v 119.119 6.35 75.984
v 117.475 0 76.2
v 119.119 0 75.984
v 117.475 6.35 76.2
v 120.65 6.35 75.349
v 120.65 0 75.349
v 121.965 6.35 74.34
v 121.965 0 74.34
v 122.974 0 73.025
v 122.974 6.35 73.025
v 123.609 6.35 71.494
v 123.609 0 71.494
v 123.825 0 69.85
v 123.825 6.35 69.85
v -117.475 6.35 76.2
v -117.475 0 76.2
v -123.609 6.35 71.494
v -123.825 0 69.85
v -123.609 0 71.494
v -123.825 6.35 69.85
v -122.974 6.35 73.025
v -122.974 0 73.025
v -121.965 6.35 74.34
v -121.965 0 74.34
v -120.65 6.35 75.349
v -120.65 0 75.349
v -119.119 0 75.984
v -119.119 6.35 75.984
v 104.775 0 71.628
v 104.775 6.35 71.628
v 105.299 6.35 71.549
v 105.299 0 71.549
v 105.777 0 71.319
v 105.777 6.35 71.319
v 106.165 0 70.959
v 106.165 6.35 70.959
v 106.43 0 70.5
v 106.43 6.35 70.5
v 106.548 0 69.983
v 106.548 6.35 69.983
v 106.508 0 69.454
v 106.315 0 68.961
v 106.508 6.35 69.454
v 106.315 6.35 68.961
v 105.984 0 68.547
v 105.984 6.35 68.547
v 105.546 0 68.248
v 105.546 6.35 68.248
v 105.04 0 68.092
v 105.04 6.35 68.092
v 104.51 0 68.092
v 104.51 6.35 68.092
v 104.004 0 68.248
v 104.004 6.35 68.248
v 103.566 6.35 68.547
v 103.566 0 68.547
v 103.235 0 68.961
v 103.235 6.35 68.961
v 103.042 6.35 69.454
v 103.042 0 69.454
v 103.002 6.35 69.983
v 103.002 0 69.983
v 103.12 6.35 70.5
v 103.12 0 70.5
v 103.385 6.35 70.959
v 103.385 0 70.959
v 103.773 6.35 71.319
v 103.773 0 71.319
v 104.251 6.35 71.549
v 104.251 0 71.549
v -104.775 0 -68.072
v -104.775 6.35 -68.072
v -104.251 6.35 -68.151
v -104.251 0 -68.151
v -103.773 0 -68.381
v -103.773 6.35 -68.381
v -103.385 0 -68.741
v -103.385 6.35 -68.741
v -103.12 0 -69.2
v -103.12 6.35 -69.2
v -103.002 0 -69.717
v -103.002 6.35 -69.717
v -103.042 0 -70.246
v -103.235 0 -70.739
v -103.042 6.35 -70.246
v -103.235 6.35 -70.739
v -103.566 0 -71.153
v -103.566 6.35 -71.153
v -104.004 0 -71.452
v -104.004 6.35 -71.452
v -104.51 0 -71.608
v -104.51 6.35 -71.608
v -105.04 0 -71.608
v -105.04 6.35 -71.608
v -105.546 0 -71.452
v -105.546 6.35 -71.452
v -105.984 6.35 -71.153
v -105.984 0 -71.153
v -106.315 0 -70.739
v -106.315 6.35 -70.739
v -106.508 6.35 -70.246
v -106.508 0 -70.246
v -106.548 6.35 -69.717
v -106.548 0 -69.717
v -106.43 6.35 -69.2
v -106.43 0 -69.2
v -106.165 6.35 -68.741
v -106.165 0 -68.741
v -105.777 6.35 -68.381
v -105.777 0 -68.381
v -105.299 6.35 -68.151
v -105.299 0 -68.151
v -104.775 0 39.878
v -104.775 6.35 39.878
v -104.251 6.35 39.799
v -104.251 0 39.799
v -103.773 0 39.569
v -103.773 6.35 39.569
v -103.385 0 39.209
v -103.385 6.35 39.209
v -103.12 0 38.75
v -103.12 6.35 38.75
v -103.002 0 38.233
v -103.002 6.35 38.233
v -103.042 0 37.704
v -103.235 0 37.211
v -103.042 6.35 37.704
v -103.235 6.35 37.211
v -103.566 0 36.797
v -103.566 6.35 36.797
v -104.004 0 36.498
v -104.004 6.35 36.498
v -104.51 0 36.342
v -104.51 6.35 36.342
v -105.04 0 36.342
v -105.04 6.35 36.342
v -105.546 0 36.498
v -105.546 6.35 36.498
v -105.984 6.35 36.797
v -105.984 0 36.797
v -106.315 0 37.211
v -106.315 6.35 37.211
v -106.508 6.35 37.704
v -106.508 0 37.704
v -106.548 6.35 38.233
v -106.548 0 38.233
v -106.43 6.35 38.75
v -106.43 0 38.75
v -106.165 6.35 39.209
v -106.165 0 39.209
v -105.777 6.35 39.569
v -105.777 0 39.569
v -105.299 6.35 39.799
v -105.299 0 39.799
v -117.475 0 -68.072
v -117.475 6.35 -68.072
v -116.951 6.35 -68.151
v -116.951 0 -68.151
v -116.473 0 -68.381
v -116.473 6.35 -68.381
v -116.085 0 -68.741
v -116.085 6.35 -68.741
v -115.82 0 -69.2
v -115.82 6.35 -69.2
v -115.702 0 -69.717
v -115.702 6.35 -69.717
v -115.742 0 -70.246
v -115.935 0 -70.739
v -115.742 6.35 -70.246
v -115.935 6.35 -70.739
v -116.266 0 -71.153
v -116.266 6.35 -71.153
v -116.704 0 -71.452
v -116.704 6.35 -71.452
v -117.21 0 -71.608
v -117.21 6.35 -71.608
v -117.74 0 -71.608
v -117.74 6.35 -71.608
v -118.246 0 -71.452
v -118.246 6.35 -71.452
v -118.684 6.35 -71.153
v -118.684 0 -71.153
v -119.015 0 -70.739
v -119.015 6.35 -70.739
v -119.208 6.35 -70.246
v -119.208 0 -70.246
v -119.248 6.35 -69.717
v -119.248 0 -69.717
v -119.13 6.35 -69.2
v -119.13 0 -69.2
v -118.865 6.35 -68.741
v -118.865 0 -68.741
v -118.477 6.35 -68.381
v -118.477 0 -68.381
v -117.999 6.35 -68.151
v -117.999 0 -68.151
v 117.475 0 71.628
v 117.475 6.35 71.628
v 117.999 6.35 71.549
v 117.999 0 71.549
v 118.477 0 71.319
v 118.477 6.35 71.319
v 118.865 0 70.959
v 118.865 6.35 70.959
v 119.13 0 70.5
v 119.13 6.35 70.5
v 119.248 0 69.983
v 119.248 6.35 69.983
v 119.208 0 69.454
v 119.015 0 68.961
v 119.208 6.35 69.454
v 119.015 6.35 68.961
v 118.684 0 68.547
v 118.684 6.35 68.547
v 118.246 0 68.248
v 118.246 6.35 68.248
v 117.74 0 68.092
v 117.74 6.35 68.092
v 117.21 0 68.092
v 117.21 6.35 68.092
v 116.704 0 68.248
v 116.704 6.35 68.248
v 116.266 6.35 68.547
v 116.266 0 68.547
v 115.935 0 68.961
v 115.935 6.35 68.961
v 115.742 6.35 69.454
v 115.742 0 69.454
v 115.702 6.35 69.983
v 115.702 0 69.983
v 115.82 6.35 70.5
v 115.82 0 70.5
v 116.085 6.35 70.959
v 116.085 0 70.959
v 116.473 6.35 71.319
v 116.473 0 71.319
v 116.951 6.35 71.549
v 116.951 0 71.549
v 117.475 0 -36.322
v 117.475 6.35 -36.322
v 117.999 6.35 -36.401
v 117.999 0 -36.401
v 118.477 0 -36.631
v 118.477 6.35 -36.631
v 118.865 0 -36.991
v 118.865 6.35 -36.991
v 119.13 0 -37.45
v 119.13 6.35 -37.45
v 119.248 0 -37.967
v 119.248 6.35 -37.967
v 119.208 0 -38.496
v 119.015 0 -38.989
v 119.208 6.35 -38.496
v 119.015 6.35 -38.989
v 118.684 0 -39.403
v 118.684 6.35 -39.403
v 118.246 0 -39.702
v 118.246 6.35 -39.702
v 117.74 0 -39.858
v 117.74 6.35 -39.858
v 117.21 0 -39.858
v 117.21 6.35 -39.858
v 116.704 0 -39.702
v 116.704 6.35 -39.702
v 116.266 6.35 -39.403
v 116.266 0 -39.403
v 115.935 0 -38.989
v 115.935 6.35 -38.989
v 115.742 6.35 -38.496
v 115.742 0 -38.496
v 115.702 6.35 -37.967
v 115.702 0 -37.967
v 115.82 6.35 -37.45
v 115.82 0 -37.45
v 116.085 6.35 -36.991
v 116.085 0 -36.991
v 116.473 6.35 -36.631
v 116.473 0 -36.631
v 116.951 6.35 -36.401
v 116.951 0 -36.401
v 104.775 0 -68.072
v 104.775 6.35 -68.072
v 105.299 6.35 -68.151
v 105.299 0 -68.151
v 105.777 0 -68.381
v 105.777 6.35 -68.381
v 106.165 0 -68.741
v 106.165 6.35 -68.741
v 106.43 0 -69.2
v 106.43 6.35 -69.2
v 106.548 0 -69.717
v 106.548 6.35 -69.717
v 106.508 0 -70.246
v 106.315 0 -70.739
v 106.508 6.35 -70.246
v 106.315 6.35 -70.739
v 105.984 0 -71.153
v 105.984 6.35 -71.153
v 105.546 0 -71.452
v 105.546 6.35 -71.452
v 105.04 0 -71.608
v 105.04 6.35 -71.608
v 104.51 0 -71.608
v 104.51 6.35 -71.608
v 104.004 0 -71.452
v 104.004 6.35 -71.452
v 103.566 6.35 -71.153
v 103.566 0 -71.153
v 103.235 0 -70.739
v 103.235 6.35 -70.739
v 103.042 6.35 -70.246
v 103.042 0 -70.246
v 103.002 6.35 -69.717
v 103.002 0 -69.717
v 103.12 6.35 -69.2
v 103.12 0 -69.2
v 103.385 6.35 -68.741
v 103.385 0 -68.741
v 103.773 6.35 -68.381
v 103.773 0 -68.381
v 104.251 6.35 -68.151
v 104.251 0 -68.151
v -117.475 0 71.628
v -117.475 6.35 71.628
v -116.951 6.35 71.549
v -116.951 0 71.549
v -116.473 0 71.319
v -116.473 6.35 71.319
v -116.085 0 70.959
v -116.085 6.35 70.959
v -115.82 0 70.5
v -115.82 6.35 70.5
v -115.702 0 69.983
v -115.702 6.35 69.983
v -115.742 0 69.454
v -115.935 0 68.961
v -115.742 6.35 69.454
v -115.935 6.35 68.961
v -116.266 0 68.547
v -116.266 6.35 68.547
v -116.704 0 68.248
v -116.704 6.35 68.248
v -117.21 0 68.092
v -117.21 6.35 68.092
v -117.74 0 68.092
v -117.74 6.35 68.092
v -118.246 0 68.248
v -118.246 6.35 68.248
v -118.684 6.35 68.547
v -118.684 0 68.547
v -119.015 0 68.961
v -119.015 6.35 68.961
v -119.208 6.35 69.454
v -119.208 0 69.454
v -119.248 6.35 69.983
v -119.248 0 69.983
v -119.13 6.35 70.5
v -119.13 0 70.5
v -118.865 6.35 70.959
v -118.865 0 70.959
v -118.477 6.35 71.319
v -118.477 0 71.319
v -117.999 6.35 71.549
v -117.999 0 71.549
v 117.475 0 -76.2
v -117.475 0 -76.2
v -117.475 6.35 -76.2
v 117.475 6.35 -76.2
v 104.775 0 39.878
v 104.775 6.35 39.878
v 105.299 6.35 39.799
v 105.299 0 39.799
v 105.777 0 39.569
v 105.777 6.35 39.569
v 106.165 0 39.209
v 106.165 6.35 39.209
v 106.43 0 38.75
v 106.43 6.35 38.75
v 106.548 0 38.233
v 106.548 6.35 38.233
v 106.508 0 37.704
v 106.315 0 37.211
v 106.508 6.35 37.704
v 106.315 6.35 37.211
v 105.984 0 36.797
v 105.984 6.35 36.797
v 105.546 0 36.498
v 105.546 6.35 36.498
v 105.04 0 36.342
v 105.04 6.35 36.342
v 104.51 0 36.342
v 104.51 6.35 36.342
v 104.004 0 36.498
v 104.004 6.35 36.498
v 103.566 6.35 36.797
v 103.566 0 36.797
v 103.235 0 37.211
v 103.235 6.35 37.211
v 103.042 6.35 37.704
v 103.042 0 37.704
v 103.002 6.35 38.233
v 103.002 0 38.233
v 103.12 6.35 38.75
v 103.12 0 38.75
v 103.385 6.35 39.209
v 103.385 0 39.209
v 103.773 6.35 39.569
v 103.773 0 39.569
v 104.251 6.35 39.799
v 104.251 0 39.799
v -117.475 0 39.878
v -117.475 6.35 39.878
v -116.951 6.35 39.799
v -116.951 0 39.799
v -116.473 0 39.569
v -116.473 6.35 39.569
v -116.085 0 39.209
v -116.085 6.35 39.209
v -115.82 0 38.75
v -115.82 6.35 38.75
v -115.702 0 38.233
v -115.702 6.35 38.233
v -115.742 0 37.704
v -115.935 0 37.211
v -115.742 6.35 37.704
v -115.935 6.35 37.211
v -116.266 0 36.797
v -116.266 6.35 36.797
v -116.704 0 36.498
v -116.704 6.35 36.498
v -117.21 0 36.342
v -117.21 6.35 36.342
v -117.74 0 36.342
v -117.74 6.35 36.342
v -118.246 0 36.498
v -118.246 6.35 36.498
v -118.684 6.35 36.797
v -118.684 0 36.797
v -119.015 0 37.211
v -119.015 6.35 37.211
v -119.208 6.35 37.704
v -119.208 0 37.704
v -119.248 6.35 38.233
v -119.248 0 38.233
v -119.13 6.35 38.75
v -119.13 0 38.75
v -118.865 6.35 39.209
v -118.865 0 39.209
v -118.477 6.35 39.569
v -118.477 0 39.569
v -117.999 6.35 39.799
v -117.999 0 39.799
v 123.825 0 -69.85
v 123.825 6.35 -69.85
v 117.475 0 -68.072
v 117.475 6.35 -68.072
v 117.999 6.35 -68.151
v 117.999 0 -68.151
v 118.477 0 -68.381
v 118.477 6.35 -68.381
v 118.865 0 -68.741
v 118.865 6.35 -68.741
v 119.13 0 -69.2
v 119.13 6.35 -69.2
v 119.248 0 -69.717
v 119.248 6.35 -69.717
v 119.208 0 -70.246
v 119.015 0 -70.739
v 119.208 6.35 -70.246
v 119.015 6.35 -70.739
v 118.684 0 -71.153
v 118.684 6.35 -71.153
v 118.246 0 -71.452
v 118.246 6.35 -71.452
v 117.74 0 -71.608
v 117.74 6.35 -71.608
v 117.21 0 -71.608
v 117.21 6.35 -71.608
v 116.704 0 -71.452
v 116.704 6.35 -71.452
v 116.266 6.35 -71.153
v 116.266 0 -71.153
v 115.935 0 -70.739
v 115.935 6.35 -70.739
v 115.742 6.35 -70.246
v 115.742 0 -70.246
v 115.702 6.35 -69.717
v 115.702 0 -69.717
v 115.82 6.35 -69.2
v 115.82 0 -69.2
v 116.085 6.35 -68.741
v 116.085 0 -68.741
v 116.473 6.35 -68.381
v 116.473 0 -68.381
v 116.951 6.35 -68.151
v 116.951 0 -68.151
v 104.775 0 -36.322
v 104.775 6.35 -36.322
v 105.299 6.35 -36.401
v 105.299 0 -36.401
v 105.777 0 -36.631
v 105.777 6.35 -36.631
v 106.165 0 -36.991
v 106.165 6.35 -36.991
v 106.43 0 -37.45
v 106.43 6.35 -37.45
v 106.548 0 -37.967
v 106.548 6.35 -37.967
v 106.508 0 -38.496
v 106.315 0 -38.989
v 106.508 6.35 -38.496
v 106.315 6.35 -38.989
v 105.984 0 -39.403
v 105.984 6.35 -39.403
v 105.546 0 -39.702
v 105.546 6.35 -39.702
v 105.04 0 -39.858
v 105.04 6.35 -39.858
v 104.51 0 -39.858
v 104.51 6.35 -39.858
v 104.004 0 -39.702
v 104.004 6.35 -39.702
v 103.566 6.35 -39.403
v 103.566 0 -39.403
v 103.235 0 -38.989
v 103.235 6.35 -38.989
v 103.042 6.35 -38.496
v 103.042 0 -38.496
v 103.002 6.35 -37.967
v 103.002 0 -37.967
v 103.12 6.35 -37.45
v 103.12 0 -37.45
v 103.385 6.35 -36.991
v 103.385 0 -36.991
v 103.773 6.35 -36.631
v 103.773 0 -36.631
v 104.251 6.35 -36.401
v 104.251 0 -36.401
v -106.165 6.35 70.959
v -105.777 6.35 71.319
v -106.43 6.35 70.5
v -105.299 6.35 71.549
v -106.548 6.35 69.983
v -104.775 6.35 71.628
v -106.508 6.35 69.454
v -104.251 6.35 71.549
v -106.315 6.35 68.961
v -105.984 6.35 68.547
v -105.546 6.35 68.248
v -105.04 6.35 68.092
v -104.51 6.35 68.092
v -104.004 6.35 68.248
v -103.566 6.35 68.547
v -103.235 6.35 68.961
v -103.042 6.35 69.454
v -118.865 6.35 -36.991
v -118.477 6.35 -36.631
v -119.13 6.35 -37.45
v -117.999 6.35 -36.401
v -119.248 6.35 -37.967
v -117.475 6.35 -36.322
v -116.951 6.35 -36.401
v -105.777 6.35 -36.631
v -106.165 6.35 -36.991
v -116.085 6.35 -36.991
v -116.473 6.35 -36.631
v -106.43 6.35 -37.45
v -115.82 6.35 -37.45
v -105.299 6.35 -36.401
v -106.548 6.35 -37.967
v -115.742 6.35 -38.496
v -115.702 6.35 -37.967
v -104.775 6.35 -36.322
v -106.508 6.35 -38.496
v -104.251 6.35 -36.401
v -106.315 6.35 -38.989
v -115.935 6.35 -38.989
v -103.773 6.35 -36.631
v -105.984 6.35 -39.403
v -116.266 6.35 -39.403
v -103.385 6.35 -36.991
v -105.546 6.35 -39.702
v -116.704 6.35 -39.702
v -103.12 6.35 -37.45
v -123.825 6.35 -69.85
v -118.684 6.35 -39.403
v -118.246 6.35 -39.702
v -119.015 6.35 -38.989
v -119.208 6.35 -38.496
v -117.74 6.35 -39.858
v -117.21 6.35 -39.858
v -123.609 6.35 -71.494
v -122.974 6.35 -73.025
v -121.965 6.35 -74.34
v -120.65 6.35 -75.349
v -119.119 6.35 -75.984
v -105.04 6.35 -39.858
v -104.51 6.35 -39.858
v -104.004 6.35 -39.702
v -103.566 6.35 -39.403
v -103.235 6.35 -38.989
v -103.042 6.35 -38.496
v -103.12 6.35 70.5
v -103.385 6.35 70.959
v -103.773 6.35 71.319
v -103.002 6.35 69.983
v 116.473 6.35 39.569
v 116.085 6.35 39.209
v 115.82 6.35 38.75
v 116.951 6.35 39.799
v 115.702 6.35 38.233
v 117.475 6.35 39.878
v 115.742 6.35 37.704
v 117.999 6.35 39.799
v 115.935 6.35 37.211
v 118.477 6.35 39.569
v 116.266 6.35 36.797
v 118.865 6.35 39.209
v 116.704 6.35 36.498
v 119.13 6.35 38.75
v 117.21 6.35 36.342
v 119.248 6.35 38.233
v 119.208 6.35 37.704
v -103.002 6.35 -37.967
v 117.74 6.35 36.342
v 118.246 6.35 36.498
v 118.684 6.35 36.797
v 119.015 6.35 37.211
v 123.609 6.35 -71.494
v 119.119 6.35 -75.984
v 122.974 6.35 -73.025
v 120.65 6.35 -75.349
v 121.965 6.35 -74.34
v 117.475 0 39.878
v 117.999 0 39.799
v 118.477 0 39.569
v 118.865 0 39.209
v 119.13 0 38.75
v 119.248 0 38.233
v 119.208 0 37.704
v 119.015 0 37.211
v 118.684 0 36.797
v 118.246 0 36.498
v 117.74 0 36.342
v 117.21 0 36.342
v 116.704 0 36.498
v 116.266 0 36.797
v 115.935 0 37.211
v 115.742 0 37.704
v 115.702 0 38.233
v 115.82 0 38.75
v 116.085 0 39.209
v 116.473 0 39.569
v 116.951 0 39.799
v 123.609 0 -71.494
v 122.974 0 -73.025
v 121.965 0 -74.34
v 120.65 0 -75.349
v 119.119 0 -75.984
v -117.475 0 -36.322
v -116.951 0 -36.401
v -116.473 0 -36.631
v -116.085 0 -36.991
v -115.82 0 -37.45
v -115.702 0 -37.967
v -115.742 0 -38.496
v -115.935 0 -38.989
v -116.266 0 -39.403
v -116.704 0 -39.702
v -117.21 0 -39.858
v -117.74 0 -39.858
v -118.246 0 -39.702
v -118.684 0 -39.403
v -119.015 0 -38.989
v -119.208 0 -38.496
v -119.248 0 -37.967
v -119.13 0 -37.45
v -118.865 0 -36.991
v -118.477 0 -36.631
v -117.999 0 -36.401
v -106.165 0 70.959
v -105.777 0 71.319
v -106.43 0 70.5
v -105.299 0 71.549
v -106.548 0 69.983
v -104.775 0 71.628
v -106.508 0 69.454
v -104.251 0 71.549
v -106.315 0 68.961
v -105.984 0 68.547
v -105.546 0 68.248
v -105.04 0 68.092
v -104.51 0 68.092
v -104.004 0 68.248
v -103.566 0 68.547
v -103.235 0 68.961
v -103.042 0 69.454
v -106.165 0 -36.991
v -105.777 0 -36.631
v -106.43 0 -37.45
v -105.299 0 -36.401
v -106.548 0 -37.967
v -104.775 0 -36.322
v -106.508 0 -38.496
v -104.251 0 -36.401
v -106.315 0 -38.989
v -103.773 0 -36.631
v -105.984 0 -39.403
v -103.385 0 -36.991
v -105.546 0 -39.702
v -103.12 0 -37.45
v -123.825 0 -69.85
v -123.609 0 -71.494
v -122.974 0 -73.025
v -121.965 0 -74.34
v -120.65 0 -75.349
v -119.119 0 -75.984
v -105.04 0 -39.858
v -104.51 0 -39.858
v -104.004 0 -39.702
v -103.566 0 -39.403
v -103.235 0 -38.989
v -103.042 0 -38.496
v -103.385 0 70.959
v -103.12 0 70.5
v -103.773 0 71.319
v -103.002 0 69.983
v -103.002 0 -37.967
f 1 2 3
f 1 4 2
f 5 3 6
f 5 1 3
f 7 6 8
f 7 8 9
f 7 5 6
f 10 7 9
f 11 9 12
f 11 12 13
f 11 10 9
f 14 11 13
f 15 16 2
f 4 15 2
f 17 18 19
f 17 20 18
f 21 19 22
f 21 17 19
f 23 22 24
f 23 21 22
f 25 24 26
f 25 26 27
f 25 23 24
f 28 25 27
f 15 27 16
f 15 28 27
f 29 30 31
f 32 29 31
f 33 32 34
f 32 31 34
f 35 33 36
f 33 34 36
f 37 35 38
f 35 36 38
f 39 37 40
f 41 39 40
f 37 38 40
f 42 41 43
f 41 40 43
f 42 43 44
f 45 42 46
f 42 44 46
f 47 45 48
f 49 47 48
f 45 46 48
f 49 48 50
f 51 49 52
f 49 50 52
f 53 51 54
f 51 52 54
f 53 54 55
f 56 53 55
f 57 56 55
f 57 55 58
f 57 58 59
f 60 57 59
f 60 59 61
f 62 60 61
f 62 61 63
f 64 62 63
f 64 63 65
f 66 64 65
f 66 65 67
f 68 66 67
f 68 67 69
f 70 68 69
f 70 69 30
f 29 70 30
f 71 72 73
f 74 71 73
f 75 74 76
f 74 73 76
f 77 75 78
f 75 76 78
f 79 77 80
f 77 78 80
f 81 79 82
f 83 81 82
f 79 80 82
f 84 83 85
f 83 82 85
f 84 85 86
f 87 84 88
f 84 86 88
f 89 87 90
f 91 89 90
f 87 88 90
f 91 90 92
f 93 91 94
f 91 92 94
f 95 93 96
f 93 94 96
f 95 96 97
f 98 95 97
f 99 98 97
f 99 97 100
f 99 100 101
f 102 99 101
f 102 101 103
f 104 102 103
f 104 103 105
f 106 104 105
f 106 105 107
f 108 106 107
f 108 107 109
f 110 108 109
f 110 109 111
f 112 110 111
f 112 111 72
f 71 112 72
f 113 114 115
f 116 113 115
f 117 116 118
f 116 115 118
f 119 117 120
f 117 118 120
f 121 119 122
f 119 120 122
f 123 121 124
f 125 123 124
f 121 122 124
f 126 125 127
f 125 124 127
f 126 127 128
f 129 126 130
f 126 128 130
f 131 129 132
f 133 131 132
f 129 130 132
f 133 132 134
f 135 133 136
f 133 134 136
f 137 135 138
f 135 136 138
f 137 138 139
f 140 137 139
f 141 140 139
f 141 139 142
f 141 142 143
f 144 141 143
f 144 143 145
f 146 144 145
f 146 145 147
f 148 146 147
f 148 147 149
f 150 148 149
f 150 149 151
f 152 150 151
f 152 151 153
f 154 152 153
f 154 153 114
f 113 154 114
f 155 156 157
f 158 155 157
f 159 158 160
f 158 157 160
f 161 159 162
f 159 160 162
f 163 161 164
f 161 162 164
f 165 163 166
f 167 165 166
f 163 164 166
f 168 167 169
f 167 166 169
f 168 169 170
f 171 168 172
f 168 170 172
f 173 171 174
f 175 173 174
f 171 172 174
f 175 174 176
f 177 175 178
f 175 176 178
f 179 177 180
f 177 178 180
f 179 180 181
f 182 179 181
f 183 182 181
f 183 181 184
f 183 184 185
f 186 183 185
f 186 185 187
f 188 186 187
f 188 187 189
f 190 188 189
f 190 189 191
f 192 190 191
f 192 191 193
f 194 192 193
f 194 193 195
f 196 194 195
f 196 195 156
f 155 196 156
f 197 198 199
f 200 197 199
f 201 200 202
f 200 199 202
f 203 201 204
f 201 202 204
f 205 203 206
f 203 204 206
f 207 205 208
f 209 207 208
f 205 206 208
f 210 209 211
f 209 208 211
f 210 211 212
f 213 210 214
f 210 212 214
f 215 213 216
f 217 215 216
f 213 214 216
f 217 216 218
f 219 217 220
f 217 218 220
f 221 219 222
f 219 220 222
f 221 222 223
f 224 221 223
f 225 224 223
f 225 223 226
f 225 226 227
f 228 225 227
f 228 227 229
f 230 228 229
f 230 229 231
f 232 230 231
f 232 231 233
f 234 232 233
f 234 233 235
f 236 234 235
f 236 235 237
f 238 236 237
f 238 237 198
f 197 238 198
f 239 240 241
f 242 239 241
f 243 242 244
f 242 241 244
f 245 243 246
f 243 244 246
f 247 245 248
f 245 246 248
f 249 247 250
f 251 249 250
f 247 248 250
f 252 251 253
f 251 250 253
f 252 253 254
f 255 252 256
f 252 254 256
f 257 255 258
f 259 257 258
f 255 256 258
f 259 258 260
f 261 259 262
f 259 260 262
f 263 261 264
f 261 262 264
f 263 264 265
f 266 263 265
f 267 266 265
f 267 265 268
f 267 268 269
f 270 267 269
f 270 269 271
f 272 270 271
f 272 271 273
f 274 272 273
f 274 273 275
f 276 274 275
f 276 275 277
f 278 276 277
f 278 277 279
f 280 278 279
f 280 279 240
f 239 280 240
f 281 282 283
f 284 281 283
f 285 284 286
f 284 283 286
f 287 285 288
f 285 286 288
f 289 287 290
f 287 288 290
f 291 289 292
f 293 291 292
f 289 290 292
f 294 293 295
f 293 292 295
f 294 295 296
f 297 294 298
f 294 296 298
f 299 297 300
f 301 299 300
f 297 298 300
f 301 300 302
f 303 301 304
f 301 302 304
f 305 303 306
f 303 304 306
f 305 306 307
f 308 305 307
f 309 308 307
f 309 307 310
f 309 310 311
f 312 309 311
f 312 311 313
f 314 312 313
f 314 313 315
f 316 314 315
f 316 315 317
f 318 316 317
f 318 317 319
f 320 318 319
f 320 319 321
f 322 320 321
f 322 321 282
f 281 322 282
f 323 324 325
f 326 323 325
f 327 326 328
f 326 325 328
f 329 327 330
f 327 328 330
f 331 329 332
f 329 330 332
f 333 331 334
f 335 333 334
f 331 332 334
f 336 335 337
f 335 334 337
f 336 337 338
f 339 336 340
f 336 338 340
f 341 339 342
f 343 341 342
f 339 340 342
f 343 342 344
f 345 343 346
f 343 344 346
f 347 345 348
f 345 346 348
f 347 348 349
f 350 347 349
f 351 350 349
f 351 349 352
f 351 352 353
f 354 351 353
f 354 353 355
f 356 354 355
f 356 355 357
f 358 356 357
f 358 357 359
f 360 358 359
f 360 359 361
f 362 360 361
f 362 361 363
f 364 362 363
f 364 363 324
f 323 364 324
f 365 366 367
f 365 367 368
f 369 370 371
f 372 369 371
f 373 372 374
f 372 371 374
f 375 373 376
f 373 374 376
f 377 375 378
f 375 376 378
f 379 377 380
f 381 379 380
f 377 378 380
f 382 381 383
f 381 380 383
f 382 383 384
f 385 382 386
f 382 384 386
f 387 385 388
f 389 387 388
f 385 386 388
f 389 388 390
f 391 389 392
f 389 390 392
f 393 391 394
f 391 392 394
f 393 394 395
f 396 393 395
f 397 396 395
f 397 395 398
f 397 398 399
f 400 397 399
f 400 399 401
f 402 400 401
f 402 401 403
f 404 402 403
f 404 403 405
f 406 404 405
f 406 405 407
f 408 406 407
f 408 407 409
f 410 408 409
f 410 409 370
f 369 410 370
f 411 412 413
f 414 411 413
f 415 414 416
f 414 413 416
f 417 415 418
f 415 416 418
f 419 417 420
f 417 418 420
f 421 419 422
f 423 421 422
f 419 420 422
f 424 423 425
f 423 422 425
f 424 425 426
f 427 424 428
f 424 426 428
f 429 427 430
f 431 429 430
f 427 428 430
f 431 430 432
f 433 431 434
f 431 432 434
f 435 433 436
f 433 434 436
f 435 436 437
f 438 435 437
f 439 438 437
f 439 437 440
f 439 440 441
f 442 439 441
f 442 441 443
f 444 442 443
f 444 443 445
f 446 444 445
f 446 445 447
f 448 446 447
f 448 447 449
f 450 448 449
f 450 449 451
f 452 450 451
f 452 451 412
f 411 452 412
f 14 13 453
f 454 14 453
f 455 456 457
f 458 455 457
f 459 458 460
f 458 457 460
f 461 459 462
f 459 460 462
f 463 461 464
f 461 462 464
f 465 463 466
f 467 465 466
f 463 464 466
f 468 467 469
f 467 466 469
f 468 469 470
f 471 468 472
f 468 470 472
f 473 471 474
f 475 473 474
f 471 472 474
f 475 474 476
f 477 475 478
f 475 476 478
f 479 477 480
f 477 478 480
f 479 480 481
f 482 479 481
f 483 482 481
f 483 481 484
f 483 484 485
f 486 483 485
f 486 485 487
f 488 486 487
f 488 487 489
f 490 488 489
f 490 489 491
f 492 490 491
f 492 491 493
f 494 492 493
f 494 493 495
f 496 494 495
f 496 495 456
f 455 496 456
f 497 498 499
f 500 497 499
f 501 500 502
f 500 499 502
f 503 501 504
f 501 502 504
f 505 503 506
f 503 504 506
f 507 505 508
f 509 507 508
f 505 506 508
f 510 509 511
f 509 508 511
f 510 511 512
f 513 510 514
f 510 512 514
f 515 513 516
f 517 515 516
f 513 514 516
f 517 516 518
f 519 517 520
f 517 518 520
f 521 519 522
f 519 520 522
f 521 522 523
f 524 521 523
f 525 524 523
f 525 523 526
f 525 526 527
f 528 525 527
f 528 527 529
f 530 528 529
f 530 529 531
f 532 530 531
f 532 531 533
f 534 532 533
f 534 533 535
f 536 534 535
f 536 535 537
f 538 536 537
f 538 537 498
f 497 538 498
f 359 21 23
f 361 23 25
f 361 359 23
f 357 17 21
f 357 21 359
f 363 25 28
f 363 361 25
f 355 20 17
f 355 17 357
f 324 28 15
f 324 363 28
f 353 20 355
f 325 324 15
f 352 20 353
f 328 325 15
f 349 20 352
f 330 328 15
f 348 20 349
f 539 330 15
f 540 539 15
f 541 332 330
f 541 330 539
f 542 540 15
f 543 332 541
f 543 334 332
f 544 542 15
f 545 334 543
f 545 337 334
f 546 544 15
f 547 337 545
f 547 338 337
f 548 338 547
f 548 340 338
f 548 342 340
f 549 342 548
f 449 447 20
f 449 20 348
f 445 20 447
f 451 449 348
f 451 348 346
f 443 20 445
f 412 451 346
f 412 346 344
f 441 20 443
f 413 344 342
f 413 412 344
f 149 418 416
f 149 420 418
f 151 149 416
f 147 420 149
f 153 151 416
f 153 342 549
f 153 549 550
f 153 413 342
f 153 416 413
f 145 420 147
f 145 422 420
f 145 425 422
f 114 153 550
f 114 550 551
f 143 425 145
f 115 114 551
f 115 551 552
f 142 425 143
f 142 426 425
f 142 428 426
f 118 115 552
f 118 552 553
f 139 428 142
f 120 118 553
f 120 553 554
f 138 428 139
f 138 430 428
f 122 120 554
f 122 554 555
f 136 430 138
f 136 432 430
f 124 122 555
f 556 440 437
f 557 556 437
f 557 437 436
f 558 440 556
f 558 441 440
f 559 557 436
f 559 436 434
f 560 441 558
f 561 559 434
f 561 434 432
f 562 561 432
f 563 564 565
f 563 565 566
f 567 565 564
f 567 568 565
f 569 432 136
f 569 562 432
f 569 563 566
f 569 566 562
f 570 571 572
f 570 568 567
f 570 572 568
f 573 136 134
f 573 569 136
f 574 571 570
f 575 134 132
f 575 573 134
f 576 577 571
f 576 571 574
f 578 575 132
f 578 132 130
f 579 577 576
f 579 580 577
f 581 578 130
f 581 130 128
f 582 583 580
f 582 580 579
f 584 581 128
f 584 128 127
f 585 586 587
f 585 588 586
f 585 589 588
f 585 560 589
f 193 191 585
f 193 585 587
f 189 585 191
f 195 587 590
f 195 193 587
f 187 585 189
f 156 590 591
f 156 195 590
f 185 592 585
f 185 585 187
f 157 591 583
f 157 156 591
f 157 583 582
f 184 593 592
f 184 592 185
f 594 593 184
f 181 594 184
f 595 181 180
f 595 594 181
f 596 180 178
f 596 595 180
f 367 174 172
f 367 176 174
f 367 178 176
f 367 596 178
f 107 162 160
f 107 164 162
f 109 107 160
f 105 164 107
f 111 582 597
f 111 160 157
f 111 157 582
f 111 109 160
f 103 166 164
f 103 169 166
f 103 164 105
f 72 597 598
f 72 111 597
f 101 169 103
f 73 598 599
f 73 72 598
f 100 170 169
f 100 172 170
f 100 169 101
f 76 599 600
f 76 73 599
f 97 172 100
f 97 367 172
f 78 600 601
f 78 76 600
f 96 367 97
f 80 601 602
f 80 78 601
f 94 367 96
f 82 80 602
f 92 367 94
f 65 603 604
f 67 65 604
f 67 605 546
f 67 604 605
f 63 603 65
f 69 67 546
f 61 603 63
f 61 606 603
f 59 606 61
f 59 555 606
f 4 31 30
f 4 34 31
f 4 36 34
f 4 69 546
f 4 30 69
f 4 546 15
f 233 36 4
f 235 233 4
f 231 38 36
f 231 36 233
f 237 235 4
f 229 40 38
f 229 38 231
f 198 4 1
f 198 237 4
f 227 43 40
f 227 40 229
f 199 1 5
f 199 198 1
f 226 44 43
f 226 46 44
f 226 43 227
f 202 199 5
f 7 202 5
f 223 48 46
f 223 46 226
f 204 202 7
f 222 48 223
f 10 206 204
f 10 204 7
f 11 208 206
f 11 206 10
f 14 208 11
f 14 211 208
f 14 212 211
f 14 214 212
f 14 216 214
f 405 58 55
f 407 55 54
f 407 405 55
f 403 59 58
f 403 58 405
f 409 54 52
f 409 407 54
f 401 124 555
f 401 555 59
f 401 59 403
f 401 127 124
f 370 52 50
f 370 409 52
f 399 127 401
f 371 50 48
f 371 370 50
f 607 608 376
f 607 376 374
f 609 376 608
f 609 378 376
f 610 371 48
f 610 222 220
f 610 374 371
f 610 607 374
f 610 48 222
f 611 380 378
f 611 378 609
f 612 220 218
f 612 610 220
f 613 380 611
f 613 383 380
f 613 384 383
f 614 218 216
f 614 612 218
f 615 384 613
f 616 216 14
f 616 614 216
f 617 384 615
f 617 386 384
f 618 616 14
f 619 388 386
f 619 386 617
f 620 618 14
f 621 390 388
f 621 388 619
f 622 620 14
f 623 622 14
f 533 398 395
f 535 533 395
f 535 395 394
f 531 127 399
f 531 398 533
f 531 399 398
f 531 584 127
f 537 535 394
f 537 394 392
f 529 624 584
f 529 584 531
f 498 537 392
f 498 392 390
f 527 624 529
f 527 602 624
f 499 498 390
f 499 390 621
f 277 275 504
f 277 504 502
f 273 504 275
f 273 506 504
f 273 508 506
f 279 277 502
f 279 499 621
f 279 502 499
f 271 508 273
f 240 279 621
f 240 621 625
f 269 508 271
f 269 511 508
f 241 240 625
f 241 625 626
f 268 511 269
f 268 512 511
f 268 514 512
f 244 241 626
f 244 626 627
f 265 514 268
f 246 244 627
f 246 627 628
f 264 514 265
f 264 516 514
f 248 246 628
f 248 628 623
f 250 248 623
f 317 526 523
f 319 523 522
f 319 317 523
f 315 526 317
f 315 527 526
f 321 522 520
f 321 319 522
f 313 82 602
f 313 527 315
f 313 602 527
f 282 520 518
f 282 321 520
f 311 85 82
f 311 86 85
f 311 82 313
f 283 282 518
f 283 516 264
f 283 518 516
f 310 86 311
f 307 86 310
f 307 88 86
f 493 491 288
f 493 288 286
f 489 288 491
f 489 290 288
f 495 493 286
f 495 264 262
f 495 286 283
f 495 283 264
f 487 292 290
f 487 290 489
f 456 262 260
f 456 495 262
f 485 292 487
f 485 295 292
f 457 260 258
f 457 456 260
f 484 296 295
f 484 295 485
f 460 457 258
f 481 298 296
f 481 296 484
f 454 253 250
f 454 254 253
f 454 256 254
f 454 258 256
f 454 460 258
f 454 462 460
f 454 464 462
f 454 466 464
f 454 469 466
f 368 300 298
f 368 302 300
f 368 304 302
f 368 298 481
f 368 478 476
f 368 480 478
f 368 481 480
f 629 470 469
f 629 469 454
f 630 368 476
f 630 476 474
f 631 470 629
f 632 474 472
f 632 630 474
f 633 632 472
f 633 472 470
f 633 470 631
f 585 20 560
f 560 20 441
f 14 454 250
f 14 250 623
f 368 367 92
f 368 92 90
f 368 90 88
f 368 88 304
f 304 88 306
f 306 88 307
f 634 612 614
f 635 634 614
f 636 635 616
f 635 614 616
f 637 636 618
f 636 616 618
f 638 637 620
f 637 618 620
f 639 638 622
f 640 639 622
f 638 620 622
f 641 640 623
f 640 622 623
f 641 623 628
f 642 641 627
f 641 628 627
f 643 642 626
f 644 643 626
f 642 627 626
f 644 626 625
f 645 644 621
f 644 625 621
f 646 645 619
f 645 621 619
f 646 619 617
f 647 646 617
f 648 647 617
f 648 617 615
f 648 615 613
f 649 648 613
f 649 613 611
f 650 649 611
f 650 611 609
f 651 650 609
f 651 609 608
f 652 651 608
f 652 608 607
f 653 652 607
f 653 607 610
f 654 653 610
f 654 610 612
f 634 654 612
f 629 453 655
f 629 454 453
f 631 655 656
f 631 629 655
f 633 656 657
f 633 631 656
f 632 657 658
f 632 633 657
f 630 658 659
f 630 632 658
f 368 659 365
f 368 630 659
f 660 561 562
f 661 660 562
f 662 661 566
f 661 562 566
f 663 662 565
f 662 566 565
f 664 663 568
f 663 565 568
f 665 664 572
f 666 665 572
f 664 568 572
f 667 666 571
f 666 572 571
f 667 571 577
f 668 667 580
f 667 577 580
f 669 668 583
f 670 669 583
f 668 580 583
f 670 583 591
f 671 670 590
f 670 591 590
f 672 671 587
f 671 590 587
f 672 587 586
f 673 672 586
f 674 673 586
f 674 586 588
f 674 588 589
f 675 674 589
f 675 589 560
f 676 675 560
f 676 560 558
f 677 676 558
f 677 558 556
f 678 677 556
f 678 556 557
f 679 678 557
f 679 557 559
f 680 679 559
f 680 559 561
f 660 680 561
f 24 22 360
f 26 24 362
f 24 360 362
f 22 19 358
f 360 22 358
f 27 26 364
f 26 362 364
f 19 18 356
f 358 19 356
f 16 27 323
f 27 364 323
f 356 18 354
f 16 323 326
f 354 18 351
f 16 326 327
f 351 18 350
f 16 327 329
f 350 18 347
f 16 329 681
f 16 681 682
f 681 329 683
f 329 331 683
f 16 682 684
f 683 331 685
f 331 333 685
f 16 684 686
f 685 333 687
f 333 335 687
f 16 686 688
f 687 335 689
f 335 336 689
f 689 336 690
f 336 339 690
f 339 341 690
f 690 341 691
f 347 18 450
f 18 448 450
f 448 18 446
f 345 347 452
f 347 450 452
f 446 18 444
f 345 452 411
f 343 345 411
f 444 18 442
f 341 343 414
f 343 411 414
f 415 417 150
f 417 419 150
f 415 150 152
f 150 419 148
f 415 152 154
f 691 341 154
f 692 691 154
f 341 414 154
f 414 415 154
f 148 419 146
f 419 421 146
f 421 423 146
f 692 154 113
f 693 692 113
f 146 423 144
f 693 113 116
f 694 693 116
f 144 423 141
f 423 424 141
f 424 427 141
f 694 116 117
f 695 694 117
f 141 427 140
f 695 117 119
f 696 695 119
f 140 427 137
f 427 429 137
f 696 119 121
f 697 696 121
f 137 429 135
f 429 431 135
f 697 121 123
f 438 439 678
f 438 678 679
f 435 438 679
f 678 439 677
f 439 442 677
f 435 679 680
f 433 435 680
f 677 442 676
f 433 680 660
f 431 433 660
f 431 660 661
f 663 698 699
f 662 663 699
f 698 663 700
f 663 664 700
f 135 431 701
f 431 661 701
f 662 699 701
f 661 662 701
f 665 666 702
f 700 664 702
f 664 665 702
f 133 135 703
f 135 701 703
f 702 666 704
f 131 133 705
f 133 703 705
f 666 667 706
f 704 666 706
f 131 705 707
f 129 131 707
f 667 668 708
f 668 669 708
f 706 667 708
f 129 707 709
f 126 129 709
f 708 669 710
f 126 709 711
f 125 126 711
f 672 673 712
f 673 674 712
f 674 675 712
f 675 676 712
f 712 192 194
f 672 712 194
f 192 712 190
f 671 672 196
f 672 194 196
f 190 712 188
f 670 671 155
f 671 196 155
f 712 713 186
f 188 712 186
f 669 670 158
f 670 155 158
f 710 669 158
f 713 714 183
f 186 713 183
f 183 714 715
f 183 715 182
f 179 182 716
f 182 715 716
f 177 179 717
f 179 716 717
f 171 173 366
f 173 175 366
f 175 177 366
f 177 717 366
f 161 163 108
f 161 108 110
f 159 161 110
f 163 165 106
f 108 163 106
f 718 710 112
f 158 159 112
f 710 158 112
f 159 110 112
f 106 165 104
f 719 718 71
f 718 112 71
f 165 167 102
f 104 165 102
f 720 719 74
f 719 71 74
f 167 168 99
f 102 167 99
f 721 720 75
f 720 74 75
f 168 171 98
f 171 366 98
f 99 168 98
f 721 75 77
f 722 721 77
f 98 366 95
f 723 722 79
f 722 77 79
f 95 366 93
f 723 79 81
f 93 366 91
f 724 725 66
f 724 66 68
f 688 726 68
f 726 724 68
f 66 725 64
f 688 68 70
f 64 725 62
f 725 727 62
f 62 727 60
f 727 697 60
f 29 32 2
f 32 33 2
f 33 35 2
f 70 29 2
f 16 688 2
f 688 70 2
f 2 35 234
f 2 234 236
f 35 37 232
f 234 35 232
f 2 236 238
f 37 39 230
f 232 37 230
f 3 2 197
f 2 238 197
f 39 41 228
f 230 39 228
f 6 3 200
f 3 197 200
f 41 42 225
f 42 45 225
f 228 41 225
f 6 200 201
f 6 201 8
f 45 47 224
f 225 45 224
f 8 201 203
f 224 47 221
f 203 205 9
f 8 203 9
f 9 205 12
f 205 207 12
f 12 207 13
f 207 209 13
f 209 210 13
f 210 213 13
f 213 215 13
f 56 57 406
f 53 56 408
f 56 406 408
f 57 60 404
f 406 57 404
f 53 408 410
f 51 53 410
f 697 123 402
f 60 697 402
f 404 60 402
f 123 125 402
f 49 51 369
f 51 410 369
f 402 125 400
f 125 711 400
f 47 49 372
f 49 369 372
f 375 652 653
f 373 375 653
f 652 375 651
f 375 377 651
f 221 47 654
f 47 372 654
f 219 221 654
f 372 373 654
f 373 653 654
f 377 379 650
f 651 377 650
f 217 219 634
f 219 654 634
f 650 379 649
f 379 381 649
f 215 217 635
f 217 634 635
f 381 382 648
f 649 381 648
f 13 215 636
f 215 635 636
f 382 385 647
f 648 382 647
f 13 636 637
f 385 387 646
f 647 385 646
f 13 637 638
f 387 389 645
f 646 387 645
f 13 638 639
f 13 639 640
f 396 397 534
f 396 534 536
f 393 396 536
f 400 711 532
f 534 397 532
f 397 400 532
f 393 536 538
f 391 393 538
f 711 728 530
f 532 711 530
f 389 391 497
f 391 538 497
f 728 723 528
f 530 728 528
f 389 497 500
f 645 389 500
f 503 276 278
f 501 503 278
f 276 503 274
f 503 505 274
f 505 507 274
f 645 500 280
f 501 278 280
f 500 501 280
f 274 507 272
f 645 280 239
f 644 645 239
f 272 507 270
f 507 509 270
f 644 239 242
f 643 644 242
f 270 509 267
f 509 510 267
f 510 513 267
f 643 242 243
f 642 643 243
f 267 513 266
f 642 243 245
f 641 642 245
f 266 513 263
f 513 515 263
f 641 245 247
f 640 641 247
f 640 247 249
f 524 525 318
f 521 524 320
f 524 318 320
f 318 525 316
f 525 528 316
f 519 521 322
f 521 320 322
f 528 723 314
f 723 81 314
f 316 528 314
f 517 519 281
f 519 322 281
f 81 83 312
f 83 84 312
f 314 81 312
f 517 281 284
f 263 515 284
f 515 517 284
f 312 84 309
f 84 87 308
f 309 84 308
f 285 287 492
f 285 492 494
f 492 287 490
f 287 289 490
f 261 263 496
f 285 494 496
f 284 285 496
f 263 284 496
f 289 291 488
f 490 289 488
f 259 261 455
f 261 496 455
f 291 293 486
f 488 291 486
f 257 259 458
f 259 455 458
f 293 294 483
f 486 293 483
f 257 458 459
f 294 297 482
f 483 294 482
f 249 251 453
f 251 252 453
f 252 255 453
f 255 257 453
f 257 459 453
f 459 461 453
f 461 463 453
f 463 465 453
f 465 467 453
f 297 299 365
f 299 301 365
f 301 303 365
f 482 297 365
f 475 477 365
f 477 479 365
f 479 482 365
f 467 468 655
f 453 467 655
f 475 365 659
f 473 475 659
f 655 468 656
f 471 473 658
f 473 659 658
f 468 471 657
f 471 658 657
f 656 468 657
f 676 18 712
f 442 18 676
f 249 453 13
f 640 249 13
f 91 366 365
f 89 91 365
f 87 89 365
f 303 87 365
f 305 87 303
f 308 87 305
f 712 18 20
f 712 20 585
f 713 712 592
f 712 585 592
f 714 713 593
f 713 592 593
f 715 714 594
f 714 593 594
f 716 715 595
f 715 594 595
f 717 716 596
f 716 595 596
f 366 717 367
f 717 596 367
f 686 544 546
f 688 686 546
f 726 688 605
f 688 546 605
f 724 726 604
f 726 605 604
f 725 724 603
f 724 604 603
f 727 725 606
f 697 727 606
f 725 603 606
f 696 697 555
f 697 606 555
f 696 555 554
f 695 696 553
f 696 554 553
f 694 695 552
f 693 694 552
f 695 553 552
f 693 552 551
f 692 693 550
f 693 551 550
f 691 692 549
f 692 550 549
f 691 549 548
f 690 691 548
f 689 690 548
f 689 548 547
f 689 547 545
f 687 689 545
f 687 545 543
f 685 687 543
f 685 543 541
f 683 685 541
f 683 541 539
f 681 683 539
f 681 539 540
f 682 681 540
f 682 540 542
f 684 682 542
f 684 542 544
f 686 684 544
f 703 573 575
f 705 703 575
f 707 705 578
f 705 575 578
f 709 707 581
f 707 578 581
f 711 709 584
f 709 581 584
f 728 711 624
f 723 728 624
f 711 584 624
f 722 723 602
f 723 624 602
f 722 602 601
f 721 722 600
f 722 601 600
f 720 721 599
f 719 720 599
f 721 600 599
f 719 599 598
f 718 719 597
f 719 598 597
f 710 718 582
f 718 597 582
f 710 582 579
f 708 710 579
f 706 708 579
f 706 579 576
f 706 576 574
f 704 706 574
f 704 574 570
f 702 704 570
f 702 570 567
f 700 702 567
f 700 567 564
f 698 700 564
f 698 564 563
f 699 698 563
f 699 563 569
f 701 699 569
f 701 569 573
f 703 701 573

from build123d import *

# Parameters (mm, degrees)
SKETCH1_W            = 247.65
SKETCH1_H            = 152.4
BOSS_EXTRUDE1_DEPTH  = 6.35
FILLET1_R            = 6.35
SKETCH2_R            = 1.778
CUT_EXTRUDE1_DEPTH   = 146.531416282
LPATTERN1_COUNT      = 2
LPATTERN1_PITCH      = 222.25
LPATTERN1_COUNT_DIR2 = 2
LPATTERN1_PITCH_DIR2 = 107.95


with BuildPart() as part:
    # Sketch1 → Boss-Extrude1 (new body)
    with BuildSketch(Plane(origin=(0, 0, 0), x_dir=(1, 0, 0), z_dir=(0, 1, 0))):
        Rectangle(SKETCH1_W, SKETCH1_H)
    extrude(amount=BOSS_EXTRUDE1_DEPTH)

    # Fillet1
    fillet1_edges = [part.edges().sort_by_distance(p)[0] for p in [
        (123.825, 3.175, 76.2),
        (-123.825, 3.175, 76.2),
        (-123.825, 3.175, -76.2),
        (123.825, 3.175, -76.2),
    ]]
    fillet(fillet1_edges, radius=FILLET1_R)

    # Sketch2 → Cut-Extrude1 (cut, through all)
    with BuildSketch(Plane(origin=(0, 6.35, 0), x_dir=(1, 0, 0), z_dir=(0, 1, 0))):
        with Locations(Location((117.475, -69.85, 0), (0, 0, 270))):
            Circle(SKETCH2_R)
        with Locations(Location((104.775, -69.85, 0), (0, 0, 270))):
            Circle(SKETCH2_R)
        with Locations(Location((117.475, -38.1, 0), (0, 0, 270))):
            Circle(SKETCH2_R)
        with Locations(Location((104.775, -38.1, 0), (0, 0, 270))):
            Circle(SKETCH2_R)
    cut_extrude1 = extrude(amount=-CUT_EXTRUDE1_DEPTH, mode=Mode.SUBTRACT)

    # LPattern1: Cut-Extrude1 2 × 2
    with Locations(*[(-i * LPATTERN1_PITCH, 0, -j * LPATTERN1_PITCH_DIR2) for i in range(LPATTERN1_COUNT) for j in range(LPATTERN1_COUNT_DIR2) if (i, j) != (0, 0)]):
        add(cut_extrude1, mode=Mode.SUBTRACT)


solid = part.part
